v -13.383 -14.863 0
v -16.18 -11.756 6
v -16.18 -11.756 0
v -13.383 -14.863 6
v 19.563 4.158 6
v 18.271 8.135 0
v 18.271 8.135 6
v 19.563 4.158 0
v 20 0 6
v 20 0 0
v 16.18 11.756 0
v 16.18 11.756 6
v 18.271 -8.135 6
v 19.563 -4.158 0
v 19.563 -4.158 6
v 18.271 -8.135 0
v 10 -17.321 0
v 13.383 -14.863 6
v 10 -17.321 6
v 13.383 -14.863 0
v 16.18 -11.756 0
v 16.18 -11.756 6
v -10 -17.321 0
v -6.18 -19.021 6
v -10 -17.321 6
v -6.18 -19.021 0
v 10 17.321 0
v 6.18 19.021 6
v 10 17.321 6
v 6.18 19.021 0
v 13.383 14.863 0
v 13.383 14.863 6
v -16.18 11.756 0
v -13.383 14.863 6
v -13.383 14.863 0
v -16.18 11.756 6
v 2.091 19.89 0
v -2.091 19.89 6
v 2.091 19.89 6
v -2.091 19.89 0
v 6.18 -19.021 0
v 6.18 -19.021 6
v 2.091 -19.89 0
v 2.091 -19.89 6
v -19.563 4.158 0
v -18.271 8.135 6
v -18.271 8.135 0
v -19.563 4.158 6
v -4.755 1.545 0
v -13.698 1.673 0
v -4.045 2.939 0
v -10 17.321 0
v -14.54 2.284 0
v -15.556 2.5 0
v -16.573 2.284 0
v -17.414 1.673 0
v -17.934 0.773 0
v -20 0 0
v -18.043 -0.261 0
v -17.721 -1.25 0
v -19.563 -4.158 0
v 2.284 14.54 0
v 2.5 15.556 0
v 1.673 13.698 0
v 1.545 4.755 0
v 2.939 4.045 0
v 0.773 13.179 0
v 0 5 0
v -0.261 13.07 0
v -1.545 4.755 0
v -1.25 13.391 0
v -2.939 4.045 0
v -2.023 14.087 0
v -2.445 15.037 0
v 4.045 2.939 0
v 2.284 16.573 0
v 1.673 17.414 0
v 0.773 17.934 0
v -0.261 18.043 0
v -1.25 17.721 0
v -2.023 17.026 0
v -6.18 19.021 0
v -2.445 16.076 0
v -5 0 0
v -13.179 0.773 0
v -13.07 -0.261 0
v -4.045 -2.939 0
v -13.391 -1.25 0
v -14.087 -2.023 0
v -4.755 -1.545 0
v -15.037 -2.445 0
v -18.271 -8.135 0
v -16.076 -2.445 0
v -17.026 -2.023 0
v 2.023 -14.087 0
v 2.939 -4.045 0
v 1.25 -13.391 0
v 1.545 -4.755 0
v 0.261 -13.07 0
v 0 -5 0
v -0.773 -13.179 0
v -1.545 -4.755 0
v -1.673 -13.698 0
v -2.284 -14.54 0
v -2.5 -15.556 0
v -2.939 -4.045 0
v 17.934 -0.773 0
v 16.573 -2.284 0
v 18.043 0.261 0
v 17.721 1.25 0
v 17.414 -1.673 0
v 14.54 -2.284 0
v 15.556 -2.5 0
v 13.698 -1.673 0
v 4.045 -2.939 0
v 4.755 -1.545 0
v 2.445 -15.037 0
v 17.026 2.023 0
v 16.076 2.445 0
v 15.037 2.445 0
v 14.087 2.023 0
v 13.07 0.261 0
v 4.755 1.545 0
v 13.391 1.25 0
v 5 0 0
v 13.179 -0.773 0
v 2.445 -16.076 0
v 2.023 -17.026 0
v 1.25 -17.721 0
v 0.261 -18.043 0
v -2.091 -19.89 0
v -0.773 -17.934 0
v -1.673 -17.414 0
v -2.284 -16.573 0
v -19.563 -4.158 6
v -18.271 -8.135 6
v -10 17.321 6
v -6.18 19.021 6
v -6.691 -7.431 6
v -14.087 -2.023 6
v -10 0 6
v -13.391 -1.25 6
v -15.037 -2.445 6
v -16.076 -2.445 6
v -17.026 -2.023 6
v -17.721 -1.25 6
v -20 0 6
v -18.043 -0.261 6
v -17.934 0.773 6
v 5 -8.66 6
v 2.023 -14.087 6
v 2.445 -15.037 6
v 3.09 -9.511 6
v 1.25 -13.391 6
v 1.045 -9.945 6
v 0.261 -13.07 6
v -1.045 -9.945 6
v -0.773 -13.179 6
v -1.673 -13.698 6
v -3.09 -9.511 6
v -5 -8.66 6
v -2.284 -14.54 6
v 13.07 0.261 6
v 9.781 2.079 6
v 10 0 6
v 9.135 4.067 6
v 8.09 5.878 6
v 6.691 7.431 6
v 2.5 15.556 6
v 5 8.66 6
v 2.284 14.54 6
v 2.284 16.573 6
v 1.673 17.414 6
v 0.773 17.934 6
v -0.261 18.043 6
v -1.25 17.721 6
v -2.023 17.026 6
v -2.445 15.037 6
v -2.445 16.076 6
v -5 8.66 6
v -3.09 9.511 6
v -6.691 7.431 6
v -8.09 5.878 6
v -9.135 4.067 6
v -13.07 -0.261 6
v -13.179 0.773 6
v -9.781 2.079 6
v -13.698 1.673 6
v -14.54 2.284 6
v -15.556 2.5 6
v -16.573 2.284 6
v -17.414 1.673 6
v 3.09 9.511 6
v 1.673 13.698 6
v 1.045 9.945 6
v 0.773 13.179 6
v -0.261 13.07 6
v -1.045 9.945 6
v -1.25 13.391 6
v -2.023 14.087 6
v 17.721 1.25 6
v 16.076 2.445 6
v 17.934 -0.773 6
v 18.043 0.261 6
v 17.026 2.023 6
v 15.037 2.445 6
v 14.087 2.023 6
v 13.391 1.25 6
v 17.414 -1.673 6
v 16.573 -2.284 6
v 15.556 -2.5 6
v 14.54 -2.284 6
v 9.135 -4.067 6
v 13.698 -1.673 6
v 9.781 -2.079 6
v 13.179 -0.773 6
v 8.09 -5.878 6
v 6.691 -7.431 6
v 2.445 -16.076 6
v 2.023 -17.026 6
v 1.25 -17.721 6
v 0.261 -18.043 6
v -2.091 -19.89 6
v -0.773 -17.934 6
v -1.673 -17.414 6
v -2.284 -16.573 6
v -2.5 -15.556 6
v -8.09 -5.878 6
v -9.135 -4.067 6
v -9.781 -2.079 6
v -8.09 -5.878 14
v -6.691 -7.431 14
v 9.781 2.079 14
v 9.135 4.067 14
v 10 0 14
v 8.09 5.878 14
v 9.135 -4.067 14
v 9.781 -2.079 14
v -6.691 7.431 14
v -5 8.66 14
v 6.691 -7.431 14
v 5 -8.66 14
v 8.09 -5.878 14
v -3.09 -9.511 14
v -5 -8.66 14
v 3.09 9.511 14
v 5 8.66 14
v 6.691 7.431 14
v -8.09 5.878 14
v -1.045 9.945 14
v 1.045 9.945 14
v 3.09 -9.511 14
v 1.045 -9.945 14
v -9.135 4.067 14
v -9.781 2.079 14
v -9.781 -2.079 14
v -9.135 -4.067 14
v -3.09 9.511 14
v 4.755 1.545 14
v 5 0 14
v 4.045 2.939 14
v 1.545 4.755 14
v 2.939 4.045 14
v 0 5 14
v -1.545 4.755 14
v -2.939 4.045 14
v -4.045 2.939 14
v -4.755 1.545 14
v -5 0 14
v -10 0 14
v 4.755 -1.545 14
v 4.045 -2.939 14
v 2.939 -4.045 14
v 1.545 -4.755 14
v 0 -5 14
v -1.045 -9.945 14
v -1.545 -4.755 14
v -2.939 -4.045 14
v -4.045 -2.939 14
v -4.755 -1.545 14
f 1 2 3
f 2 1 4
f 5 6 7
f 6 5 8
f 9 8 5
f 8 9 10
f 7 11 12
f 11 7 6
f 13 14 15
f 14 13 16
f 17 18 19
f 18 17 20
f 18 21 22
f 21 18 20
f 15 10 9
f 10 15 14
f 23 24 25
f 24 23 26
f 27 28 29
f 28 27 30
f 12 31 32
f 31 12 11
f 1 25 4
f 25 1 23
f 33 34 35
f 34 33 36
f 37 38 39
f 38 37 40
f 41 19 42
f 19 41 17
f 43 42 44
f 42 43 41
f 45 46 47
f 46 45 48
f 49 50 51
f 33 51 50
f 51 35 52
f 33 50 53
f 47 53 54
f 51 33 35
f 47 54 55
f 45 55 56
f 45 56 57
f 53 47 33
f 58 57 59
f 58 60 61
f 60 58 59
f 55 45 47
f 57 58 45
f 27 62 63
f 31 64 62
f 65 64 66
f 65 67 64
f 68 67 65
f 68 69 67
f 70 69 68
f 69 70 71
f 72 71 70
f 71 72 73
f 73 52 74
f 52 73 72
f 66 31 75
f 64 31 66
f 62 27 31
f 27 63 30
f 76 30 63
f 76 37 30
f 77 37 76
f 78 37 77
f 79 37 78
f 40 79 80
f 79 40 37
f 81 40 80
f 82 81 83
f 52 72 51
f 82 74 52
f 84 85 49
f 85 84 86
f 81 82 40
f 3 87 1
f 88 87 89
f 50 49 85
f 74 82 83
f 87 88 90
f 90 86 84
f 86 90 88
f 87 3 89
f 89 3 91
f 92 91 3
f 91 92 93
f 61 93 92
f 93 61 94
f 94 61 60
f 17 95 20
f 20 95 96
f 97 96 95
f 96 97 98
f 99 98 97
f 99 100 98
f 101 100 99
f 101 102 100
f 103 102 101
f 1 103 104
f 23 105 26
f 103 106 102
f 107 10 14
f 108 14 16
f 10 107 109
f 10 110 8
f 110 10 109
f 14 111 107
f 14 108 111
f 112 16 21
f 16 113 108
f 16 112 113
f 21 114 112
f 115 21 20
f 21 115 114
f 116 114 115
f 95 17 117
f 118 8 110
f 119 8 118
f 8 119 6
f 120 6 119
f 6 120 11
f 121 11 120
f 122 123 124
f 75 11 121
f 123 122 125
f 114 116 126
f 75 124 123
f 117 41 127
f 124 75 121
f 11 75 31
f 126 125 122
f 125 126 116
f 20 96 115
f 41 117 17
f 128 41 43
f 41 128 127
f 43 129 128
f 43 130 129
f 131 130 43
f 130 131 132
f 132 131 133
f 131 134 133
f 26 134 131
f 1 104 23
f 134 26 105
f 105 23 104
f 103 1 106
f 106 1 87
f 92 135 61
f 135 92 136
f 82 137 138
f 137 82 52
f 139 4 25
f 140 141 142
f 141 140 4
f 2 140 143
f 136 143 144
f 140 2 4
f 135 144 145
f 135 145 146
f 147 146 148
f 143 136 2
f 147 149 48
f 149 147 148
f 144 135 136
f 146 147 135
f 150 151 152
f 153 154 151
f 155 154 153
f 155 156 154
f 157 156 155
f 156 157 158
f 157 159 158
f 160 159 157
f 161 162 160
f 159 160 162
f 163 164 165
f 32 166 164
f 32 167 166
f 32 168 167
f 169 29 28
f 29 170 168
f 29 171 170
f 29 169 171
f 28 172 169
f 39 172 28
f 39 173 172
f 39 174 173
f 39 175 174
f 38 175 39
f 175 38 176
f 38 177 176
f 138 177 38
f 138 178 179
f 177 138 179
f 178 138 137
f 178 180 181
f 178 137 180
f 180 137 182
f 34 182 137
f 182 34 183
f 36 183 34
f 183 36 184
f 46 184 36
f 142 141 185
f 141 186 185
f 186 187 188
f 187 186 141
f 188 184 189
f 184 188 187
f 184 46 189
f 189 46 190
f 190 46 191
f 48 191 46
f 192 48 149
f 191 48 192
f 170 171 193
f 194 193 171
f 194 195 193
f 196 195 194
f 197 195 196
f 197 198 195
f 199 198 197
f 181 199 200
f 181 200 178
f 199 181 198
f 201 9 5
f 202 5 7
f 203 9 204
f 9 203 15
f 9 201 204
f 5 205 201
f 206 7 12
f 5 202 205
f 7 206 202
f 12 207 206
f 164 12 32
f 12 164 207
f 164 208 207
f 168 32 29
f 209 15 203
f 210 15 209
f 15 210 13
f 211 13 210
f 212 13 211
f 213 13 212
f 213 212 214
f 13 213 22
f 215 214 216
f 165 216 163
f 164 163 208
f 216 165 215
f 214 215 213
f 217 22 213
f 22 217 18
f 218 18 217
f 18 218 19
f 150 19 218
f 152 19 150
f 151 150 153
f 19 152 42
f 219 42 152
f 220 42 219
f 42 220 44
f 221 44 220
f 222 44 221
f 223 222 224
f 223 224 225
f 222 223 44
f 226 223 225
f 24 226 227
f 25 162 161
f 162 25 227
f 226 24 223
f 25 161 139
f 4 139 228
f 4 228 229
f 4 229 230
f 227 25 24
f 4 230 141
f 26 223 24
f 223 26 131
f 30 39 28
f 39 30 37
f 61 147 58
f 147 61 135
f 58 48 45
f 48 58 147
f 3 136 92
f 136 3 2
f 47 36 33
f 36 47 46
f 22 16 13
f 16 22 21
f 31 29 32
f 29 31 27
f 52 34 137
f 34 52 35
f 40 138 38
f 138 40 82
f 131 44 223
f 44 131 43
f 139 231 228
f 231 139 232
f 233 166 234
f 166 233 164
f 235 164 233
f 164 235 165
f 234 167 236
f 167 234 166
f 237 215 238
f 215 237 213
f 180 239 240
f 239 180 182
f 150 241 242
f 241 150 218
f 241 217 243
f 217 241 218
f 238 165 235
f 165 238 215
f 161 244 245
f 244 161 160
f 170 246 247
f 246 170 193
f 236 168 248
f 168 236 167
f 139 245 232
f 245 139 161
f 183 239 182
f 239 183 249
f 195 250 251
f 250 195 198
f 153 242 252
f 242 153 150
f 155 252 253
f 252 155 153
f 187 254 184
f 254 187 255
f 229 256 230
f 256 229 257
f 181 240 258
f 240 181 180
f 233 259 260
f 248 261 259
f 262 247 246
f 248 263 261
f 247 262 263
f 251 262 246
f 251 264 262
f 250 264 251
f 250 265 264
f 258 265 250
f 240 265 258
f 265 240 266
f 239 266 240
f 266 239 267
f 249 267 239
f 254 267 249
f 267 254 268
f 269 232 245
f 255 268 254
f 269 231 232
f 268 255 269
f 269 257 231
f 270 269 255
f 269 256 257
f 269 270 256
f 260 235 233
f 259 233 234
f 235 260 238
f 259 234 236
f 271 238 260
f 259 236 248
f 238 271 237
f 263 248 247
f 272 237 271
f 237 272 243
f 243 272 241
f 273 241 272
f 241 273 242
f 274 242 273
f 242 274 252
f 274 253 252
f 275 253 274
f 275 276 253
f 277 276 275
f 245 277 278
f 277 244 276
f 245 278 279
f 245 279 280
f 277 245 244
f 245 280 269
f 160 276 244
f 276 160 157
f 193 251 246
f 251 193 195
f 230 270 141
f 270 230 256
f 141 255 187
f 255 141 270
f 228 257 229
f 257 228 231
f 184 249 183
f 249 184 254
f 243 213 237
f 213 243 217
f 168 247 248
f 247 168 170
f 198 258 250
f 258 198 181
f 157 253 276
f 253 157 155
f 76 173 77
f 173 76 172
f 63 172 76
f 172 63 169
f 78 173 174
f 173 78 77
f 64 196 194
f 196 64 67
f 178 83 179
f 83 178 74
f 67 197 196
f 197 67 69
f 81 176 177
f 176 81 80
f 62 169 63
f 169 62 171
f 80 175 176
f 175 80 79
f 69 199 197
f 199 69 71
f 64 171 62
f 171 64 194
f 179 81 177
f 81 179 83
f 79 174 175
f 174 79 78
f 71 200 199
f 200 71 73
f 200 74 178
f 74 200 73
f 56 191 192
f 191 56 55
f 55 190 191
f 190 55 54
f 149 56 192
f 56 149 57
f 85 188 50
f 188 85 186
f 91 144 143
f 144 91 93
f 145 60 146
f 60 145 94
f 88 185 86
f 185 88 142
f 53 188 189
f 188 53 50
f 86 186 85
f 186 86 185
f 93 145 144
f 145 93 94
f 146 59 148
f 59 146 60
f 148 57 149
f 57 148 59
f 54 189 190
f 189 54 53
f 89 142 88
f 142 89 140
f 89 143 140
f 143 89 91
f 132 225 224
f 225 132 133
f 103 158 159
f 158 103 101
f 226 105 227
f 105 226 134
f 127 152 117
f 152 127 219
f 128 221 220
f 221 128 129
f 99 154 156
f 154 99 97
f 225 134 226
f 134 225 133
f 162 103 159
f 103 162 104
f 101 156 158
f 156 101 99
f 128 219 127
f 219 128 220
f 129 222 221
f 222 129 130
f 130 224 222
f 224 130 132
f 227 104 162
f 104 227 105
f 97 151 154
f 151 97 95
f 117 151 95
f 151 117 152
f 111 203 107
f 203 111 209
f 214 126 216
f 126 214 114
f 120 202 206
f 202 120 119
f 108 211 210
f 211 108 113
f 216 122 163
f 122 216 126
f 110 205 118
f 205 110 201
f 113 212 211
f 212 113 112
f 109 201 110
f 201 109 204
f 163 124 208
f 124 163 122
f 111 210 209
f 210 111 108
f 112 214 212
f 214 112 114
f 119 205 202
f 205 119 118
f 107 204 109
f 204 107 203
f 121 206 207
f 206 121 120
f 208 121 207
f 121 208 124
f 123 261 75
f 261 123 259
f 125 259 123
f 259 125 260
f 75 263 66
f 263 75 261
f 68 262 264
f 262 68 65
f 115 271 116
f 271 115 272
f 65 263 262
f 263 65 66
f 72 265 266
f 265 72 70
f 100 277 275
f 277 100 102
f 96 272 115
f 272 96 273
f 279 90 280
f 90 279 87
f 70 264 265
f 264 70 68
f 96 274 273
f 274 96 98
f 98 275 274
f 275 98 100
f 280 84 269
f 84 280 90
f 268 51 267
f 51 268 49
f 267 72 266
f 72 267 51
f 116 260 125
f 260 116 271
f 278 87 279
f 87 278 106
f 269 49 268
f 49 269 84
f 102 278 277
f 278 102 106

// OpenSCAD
// file: tolerance.scad
// Author: Mihai Oltean, https://mihaioltean.github.io, mihai.oltean@gmail.com
// More details: https://jenny5.org, https://jenny5-robot.github.io/
// Source code: github.com/jenny5-robot
// MIT License
//--------------------------------------------------------------

tolerance = 0.1;
display_tolerance = 1;

overlap_tolerance = 0.01;

tolerance_z = [0, 0, tolerance];
tolerance_x = [tolerance, 0, 0];
tolerance_y = [0, tolerance, 0];

display_tolerance_z = [0, 0, display_tolerance];
display_tolerance_x = [display_tolerance, 0, 0];
display_tolerance_y = [0, display_tolerance, 0];

display_tolerance_xz = [display_tolerance, 0, display_tolerance];
display_tolerance_xy = [display_tolerance, display_tolerance, 0];
display_tolerance_yz = [0, display_tolerance, display_tolerance];

display_tolerance_xyz = [display_tolerance, display_tolerance, display_tolerance];
// file: config.scad
// Author: Mihai Oltean, https://mihaioltean.github.io, mihai.oltean@gmail.com
// More details: https://jenny5.org, https://jenny5-robot.github.io/
// Source code: github.com/jenny5-robot
// MIT License
//--------------------------------------------------------------

aluminium_color = "Silver";
screw_color = "LightSlateGray";
frame_color = aluminium_color;
shaft_color = "Silver";
plastic_color = "Yellow";
pulley_color = "DarkSlateGray";
steel_color = "LightSlateGray";
// file: params_basic_components.scad
// Author: Mihai Oltean, https://mihaioltean.github.io, mihai.oltean@gmail.com
// More details: https://jenny5.org, https://jenny5-robot.github.io/
// Source code: github.com/jenny5-robot
// MIT License
//--------------------------------------------------------------

spring_length = 20;

smooth_rod_8_radius = 4;
smooth_rod_10_radius = 5;
smooth_rod_12_radius = 6;

wall_thick_1 = 1;
wall_thick_2 = 2;
wall_thick_3 = 3;
wall_thick_4 = 4;
wall_thick_5 = 5;
wall_thick_5_5 = 5.5;
wall_thick_6 = 6;
wall_thick_7 = 7;
wall_thick_8 = 8;
wall_thick_9 = 9;
wall_thick_10 = 10;
wall_thick_12 = 12;
// main file
// Author: Mihai Oltean, https://mihaioltean.github.io, mihai.oltean@gmail.com
// More details: https://jenny5.org, https://jenny5-robot.github.io/
// Source code: github.com/jenny5-robot
// MIT License
//--------------------------------------------------------------

include <params_basic_components.scad>
include <config.scad>
include <tolerance.scad>

module screw_hub(internal_radius, large_external_radius, small_external_radius, large_cylinder_thick, small_cylinder_thick, screws_hole_radius, distance_between_screws_hole)
{
    difference(){
        union(){
            color(aluminium_color) cylinder(h = large_cylinder_thick, r = large_external_radius);
            translate ([0, 0, large_cylinder_thick]) color(aluminium_color) cylinder(h = small_cylinder_thick, r = small_external_radius);
        }
        // shaft hole
        translate (-display_tolerance_z) cylinder(h = large_cylinder_thick + small_cylinder_thick + 2 * display_tolerance, r = internal_radius, $fn = 20);
        // screw holes
        for (i = [0 : 3])
            rotate([0, 0, i * 90])
        translate([0, distance_between_screws_hole * sqrt(2) / 2, 0] - display_tolerance_z)
        cylinder(h = large_cylinder_thick + 2 * display_tolerance, r = screws_hole_radius, $fn = 15);
    }
}

screw_hub(internal_radius = 5, large_external_radius = 20, small_external_radius = 10, large_cylinder_thick = 6, small_cylinder_thick = 8, screws_hole_radius = 2.5, distance_between_screws_hole = 22);
